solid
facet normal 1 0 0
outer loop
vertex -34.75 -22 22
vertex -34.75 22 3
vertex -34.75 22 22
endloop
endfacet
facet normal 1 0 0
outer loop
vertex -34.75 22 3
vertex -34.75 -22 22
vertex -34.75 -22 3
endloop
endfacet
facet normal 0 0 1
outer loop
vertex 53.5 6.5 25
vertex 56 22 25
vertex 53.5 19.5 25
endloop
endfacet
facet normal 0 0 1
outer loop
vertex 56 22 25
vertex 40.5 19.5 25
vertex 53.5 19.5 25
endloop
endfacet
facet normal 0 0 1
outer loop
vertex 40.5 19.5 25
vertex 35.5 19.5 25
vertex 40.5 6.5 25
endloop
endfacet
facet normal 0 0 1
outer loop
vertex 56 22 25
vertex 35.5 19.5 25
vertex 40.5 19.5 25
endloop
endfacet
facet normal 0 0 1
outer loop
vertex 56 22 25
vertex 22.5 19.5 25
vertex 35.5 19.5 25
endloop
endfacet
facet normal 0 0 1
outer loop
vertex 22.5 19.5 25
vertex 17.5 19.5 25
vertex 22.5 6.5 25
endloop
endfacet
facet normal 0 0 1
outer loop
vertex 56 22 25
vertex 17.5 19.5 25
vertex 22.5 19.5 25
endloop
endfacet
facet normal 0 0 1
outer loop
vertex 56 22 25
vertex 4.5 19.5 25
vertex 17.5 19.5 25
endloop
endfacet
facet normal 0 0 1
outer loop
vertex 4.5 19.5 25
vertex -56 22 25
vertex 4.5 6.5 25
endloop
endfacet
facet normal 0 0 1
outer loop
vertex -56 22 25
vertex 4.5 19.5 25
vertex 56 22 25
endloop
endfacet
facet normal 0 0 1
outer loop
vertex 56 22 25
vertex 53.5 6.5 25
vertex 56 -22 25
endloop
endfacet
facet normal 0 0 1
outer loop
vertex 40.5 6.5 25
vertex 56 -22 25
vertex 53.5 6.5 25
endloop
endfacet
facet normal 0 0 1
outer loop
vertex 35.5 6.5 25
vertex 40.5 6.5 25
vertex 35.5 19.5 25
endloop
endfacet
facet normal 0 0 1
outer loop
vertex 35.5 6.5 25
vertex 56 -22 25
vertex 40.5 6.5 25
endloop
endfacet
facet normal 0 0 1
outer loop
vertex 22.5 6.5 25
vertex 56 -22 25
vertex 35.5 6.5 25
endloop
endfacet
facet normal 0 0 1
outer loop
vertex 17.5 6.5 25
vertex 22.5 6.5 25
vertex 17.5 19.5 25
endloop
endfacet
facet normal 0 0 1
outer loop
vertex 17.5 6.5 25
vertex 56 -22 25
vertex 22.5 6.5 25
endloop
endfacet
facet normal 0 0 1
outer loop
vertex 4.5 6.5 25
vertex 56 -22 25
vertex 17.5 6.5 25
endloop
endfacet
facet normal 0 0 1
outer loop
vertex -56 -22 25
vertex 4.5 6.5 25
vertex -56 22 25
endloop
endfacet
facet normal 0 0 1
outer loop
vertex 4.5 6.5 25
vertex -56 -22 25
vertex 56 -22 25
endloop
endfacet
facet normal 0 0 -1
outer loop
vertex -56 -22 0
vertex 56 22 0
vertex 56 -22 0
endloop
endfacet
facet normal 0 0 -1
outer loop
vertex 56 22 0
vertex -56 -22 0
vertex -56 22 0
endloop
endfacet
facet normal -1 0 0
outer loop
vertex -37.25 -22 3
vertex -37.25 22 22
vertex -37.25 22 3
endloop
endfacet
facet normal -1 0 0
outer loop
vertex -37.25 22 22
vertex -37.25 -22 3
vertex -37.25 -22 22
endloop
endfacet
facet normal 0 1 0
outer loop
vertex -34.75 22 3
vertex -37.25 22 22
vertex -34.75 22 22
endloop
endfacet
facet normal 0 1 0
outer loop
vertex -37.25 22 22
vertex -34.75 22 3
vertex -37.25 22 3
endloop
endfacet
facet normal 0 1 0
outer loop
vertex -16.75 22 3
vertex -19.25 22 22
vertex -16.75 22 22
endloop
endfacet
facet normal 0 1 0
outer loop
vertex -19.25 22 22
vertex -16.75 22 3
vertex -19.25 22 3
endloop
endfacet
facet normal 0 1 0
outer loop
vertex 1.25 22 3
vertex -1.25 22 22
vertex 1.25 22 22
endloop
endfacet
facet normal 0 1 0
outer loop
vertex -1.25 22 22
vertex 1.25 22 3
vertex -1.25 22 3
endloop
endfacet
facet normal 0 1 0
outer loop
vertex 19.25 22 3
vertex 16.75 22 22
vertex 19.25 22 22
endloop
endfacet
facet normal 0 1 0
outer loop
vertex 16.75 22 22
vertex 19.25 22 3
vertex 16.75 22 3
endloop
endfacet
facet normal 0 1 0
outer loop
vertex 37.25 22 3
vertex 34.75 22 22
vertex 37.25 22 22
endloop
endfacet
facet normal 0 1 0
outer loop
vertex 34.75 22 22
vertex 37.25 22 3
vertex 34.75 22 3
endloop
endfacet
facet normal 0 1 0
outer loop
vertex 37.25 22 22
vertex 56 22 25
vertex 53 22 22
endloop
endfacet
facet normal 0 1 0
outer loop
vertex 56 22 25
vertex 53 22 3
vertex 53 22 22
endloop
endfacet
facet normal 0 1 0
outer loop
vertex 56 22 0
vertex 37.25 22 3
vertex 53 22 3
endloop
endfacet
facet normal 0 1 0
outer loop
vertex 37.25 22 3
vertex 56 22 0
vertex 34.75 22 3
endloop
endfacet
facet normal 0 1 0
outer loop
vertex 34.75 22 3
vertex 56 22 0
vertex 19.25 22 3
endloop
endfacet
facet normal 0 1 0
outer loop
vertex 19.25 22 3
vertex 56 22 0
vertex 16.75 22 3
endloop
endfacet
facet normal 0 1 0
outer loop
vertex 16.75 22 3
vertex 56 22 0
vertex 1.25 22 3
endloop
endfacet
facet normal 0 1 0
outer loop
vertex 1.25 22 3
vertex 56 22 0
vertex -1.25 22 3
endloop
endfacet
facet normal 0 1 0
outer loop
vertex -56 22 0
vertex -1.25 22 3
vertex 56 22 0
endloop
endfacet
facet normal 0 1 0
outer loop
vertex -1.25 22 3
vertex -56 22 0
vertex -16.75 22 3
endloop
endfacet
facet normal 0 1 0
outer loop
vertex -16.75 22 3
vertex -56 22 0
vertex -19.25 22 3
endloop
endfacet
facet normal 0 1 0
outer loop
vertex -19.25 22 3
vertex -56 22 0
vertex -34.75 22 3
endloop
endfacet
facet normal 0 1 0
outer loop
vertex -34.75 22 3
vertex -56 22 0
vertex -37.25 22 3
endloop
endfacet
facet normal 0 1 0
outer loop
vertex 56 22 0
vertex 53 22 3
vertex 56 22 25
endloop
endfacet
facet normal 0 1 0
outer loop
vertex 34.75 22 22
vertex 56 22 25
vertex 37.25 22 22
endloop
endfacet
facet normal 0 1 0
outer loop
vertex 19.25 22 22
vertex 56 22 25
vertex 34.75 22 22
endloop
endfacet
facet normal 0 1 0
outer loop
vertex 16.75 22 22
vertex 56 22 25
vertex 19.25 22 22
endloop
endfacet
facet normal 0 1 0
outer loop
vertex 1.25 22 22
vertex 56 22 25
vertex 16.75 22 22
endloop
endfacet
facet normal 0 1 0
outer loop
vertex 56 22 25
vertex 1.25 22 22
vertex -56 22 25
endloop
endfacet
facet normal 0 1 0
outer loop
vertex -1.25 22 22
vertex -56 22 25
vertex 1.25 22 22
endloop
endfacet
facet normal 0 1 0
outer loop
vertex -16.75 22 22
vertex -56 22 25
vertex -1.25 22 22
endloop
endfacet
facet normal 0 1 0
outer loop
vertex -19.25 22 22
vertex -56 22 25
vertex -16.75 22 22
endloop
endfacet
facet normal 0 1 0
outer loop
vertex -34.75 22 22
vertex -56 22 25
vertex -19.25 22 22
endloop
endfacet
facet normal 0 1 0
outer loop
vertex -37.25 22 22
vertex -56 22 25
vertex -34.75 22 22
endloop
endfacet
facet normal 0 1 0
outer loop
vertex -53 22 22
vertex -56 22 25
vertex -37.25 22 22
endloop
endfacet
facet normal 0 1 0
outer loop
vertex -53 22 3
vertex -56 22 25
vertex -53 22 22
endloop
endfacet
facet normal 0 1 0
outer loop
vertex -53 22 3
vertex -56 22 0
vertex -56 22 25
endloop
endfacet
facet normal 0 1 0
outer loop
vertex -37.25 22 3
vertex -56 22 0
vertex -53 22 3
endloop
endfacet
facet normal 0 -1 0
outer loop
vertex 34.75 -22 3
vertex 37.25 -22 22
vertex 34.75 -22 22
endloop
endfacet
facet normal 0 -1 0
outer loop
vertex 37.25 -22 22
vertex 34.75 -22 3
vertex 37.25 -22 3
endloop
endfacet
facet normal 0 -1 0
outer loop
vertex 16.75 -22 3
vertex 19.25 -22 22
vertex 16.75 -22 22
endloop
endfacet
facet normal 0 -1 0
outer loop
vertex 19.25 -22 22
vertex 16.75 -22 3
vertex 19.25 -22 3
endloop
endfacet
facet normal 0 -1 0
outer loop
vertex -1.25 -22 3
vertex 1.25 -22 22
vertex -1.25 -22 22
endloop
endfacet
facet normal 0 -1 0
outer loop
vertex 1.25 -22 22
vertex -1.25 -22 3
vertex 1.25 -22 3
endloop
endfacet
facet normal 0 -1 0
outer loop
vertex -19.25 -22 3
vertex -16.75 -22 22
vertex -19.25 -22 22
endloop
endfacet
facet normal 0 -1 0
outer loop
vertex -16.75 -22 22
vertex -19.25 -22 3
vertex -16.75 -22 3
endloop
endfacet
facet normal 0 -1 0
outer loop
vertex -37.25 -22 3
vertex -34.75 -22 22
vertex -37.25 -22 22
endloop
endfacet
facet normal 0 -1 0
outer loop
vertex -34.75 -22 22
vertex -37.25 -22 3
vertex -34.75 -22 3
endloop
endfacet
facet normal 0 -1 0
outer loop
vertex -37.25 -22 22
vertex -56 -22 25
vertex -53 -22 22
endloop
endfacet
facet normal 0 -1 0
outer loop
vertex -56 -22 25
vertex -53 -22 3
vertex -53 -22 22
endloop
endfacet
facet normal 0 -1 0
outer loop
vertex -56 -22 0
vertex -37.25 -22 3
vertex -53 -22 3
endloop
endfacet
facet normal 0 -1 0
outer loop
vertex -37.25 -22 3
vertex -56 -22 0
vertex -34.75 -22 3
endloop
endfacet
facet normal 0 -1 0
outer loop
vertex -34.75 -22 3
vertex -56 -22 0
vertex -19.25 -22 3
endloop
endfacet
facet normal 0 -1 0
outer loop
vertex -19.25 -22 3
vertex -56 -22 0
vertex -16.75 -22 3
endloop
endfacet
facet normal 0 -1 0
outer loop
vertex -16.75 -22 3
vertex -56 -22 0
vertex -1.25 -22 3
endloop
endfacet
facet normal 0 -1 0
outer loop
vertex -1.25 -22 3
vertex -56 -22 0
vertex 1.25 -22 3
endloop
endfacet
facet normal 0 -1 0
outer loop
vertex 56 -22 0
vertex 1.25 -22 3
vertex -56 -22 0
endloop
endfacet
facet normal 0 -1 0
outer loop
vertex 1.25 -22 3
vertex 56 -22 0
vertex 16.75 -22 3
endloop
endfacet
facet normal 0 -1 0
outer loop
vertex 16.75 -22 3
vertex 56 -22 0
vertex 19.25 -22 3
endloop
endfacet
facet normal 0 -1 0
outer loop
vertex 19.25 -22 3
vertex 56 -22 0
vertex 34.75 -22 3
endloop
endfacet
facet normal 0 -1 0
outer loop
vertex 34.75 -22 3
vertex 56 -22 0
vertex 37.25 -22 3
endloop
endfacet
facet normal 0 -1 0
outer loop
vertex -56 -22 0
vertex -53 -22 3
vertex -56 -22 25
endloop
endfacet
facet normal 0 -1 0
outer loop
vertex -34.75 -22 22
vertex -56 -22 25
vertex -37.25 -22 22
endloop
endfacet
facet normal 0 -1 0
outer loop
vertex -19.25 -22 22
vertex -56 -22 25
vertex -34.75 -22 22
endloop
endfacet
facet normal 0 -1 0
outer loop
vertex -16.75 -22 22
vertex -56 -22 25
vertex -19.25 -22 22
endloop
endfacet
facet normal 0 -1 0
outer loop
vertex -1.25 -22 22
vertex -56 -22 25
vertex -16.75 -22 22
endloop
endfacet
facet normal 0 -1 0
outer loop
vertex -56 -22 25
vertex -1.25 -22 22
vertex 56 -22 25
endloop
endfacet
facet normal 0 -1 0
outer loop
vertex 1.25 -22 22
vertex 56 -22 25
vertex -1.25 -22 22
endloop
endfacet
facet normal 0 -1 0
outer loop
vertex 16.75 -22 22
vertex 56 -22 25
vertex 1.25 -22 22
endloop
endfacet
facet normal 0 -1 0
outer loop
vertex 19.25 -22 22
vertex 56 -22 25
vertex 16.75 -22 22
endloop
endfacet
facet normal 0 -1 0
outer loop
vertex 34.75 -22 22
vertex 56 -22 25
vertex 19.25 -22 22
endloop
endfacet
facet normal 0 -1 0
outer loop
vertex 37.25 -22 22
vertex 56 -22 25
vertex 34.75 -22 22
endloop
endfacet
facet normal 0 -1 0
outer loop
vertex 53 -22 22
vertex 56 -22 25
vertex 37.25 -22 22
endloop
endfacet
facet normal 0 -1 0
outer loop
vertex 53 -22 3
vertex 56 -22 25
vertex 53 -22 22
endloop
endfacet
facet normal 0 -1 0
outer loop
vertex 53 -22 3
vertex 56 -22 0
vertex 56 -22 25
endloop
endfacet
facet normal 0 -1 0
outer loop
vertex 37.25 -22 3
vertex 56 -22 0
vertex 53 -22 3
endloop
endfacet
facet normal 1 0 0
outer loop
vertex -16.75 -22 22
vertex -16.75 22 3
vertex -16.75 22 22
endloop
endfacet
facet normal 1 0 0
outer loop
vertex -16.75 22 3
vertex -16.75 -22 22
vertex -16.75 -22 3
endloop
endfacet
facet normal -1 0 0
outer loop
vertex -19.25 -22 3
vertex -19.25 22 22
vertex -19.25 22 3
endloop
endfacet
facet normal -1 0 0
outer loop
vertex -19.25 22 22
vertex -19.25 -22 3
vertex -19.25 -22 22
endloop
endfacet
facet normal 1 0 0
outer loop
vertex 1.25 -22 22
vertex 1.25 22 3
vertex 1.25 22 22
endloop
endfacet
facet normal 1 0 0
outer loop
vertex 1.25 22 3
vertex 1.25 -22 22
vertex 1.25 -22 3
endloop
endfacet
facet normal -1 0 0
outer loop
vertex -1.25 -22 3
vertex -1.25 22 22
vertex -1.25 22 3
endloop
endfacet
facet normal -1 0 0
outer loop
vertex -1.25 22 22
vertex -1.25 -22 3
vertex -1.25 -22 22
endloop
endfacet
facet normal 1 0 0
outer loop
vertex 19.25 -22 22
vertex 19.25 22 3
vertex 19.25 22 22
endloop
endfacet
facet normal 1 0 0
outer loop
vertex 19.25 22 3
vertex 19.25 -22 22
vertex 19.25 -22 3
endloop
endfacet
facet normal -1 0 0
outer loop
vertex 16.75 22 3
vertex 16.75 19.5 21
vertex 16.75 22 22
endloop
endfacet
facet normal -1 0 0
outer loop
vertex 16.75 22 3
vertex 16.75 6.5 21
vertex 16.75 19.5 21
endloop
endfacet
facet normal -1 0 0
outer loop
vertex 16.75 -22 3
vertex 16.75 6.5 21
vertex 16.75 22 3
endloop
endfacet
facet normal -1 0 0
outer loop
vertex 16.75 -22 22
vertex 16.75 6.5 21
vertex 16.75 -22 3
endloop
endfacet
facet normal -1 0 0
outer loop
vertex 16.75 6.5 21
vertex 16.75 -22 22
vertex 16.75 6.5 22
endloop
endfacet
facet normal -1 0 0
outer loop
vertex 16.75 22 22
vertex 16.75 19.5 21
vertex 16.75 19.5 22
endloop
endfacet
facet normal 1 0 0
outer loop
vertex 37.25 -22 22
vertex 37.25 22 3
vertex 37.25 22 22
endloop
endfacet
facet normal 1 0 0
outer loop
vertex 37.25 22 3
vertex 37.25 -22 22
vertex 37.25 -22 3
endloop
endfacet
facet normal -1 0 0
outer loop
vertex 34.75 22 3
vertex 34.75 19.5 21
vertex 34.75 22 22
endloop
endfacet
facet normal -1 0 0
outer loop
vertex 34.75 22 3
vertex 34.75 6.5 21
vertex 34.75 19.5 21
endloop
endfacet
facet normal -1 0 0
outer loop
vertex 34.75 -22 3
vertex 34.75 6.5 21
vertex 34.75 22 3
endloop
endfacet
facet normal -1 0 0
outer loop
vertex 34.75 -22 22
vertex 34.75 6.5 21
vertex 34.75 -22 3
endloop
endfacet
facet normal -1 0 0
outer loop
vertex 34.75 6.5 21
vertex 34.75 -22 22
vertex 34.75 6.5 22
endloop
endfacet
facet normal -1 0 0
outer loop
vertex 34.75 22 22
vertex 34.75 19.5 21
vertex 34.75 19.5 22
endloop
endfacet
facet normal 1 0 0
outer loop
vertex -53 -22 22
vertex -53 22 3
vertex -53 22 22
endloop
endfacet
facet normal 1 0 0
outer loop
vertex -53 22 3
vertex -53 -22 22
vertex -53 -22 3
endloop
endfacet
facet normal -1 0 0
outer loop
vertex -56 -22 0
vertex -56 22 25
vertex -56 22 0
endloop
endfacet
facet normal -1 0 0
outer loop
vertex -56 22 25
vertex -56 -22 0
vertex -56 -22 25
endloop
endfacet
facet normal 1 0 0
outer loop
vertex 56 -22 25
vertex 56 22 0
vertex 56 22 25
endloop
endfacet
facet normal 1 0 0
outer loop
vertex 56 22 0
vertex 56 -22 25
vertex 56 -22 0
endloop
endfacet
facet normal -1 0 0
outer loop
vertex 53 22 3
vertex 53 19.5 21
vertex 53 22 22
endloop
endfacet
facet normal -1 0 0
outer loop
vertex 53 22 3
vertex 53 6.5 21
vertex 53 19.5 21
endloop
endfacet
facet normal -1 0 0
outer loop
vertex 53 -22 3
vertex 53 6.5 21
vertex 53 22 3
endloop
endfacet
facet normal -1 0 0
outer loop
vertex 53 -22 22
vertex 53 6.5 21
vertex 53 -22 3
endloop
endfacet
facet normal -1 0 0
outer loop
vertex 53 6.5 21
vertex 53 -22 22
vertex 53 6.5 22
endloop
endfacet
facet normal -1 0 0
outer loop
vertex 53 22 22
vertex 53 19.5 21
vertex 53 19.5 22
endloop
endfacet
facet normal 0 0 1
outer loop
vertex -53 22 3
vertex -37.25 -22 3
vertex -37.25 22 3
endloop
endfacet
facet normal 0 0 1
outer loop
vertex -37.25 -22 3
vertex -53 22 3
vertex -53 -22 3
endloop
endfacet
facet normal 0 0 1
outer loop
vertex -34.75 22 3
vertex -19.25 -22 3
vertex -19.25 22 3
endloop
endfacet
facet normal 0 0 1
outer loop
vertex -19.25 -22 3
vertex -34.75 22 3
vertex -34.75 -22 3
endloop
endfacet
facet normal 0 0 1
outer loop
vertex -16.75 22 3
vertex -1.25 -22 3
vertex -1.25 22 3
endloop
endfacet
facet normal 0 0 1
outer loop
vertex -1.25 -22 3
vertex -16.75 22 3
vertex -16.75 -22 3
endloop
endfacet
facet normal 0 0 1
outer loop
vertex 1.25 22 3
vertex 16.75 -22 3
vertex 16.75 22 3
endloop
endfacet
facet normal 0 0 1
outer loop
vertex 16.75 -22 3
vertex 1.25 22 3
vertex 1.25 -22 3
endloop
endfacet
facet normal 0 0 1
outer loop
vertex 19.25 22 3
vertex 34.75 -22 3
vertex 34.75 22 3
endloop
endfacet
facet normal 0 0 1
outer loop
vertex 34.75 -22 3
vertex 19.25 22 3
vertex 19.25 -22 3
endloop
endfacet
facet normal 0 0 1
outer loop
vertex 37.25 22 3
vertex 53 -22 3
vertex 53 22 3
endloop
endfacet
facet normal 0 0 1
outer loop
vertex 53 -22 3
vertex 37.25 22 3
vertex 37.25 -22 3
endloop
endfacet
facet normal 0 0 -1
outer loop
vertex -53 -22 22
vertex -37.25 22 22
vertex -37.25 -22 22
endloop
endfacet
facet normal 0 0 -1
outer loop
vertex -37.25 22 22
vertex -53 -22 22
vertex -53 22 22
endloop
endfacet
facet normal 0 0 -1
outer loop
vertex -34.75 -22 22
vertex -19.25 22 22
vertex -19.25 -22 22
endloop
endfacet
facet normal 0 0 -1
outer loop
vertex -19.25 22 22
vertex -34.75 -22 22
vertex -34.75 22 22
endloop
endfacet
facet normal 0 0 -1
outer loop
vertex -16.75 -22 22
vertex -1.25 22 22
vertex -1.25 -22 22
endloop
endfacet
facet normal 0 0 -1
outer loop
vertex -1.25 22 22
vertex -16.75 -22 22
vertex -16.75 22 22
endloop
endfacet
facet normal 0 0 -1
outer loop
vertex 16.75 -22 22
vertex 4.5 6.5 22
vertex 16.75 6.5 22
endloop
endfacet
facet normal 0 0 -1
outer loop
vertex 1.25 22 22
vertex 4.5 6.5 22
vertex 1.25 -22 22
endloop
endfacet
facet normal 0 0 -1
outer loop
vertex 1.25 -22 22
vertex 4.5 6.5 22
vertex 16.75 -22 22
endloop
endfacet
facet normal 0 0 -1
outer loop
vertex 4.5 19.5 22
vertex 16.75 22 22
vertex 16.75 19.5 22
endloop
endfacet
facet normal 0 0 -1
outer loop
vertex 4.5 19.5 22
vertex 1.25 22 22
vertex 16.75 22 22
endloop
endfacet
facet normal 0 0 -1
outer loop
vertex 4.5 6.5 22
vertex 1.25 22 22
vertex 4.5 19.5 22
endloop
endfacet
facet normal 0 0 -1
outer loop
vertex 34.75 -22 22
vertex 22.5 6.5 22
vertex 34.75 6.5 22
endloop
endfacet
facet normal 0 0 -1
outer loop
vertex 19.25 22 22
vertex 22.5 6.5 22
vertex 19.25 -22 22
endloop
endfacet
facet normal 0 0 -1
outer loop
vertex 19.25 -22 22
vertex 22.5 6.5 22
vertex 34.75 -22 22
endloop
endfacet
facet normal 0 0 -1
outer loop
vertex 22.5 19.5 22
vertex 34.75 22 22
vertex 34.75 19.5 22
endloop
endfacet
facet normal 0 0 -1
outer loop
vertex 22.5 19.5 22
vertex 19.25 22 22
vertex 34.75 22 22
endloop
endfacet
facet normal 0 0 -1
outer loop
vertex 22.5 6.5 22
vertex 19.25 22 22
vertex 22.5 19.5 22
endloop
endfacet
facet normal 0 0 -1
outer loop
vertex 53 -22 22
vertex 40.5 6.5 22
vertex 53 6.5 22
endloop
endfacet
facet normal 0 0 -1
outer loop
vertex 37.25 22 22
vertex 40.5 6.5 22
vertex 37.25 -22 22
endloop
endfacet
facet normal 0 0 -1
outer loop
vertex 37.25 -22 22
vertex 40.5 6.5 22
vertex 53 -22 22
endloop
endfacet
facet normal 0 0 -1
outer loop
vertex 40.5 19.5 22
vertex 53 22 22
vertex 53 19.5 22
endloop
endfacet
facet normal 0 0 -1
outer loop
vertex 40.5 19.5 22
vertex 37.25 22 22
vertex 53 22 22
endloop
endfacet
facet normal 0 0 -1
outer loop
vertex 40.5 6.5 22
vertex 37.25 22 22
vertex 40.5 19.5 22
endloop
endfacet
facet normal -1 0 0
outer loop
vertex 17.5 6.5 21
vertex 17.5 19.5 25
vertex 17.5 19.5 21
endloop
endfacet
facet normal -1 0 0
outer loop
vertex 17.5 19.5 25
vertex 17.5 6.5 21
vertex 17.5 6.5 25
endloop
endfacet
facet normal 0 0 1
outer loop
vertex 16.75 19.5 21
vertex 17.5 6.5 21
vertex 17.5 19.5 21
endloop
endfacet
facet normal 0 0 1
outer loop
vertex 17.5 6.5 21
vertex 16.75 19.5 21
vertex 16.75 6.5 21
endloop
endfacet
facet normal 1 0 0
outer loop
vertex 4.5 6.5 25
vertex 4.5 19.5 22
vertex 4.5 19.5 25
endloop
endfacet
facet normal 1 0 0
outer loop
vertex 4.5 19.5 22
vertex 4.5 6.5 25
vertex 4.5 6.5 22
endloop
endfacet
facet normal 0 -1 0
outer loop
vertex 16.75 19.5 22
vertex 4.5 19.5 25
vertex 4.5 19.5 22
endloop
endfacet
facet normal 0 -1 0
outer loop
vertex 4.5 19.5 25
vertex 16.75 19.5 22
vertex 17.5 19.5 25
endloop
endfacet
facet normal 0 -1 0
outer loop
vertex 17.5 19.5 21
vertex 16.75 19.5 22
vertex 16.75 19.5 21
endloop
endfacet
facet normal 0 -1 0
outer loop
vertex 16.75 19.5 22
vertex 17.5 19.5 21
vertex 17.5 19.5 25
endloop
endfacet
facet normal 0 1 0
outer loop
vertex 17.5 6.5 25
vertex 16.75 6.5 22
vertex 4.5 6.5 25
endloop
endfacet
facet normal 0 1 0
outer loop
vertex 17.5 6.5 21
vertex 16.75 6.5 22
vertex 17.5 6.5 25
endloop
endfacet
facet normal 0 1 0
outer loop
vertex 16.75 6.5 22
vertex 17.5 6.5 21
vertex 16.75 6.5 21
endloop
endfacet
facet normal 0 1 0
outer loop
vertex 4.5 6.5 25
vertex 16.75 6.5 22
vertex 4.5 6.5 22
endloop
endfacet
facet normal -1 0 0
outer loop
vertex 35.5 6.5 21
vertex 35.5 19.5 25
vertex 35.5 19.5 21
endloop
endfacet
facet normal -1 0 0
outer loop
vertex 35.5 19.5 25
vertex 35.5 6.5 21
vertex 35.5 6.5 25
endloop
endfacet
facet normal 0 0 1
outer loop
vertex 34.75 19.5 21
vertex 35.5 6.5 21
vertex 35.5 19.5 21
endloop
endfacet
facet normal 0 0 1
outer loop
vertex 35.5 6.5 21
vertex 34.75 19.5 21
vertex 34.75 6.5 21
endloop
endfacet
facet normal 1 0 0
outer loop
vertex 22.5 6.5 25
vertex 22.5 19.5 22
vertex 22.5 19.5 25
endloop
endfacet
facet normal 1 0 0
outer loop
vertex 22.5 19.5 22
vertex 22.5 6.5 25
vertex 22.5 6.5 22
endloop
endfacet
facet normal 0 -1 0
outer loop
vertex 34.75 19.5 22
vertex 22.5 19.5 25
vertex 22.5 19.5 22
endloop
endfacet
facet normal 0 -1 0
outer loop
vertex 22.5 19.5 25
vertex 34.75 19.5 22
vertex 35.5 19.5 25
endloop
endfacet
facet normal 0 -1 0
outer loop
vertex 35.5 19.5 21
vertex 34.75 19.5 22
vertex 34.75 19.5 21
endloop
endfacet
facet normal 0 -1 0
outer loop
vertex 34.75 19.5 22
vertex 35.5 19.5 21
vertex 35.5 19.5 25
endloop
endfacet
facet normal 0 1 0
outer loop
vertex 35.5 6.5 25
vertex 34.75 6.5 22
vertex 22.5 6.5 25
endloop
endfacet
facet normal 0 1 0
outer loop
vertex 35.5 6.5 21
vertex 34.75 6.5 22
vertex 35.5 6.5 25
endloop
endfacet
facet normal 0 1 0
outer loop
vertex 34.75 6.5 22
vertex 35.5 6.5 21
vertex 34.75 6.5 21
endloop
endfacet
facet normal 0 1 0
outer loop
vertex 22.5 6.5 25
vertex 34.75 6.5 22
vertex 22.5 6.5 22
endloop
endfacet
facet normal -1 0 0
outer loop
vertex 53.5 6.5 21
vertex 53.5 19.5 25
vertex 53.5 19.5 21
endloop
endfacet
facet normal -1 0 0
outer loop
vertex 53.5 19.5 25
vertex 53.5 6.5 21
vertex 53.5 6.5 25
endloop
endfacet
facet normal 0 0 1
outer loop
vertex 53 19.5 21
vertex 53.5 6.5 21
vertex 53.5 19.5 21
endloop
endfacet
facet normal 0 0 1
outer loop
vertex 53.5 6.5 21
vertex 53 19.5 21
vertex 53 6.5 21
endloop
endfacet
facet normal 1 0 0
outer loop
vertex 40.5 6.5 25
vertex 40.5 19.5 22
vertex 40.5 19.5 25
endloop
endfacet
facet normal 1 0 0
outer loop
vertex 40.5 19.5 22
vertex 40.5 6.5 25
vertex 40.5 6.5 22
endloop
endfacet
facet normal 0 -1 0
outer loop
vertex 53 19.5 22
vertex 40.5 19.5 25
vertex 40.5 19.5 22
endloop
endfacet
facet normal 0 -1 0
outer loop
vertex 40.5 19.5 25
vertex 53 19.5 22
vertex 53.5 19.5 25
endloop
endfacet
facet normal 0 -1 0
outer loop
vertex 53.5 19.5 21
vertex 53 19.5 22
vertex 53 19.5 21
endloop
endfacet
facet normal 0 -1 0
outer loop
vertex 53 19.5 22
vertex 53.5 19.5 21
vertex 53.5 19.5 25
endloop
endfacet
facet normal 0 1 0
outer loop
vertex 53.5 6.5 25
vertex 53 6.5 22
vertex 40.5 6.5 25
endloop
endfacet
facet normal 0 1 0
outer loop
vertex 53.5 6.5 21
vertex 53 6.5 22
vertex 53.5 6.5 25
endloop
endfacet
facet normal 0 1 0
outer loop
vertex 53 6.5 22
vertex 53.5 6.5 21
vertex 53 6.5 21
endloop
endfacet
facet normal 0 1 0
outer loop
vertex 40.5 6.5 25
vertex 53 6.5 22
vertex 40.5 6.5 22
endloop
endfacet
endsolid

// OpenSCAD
// --- Dimensions ---
base_width_x = 112;       // Total width of the base plate (X)
base_depth_y = 44;        // Total depth of the base plate (Y)
base_thickness = 3;       // Thickness of the base plate (Z)

deck_width_x = 112;       // Total width of the deck plate (X)
deck_depth_y = 44;        // Total depth of the deck plate (Y)
deck_z_start = 22;        // Z-coordinate where the deck starts
deck_thickness = 3;       // Thickness of the deck plate (Z)

end_wall_thickness = 3;   // Thickness of the two end walls
rib_thickness = 2.5;      // Thickness of the five internal ribs
wall_height = 25;         // Total height of the upright walls (Z)

// Hole dimensions (for 12.5mm cuvettes)
hole_size = 13;           // Width and depth of the square holes
hole_spacing_x = 18;      // Center-to-center spacing along X
hole_spacing_y = 18;      // Center-to-center spacing along Y
rows = 2;                 // Number of rows along Y
cols = 6;                 // Number of columns along X

/* [Render Settings] */
$fn = 64;

// --- Main Assembly ---

difference() {
    union() {
        // 1. The Base Plate
        // Sits on the bed from z=0 to z=3
        translate([0, 0, base_thickness/2])
            cube([base_width_x, base_depth_y, base_thickness], center = true);

        // 2. The Deck Plate
        // Sits from z=22 to z=25
        translate([0, 0, deck_z_start + deck_thickness/2])
            cube([deck_width_x, deck_depth_y, deck_thickness], center = true);

        // 3. The Upright Walls (End walls and Ribs)
        // These run from z=0 to z=25
        union() {
            // Two End Walls
            // Flush with the short ends (X = +/- 56)
            // To be flush with the 112mm edge, the outer face is at +/- 56.
            // The center of a 3mm wall is at +/- (56 - 1.5) = +/- 54.5
            translate([-(base_width_x/2 - end_wall_thickness/2), 0, wall_height/2])
                cube([end_wall_thickness, base_depth_y, wall_height], center = true);
            
            translate([(base_width_x/2 - end_wall_thickness/2), 0, wall_height/2])
                cube([end_wall_thickness, base_depth_y, wall_height], center = true);

            // Five Ribs
            // Rib positions: -36, -18, 0, 18, 36
            rib_positions_x = [-36, -18, 0, 18, 36];
            for (rx = rib_positions_x) {
                translate([rx, 0, wall_height/2])
                    cube([rib_thickness, base_depth_y, wall_height], center = true);
            }
        }
    }

    // 4. The 12 Square Through-Holes
    // Holes are cut through the deck plate (z=22 to z=25)
    // We use a larger Z-extents to ensure the cut is clean through the deck.
    
    // Calculate starting offset to center the grid on the deck
    // Grid width = (cols-1)*spacing_x = 5 * 18 = 90
    // Grid height = (rows-1)*spacing_y = 1 * 18 = 18
    offset_x = (deck_width_x - (cols - 1) * hole_spacing_x) / 2;
    offset_y = (deck_depth_y - (rows - 1) * hole_spacing_y) / 2;

    // The cutter is centered on the deck's Z center (23.5)
    // We extend it from z=21.5 to z=25.5 to ensure it clears the 22-25 deck.
    translate([0, 0, deck_z_start + deck_thickness/2])
    for (i = [0 : cols - 1]) {
        for (j = [0 : rows - 1]) {
            translate([
                offset_x + i * hole_spacing_x, 
                offset_y + j * hole_spacing_y, 
                0
            ])
            cube([hole_size, hole_size, deck_thickness + 2], center = true);
        }
    }
}
